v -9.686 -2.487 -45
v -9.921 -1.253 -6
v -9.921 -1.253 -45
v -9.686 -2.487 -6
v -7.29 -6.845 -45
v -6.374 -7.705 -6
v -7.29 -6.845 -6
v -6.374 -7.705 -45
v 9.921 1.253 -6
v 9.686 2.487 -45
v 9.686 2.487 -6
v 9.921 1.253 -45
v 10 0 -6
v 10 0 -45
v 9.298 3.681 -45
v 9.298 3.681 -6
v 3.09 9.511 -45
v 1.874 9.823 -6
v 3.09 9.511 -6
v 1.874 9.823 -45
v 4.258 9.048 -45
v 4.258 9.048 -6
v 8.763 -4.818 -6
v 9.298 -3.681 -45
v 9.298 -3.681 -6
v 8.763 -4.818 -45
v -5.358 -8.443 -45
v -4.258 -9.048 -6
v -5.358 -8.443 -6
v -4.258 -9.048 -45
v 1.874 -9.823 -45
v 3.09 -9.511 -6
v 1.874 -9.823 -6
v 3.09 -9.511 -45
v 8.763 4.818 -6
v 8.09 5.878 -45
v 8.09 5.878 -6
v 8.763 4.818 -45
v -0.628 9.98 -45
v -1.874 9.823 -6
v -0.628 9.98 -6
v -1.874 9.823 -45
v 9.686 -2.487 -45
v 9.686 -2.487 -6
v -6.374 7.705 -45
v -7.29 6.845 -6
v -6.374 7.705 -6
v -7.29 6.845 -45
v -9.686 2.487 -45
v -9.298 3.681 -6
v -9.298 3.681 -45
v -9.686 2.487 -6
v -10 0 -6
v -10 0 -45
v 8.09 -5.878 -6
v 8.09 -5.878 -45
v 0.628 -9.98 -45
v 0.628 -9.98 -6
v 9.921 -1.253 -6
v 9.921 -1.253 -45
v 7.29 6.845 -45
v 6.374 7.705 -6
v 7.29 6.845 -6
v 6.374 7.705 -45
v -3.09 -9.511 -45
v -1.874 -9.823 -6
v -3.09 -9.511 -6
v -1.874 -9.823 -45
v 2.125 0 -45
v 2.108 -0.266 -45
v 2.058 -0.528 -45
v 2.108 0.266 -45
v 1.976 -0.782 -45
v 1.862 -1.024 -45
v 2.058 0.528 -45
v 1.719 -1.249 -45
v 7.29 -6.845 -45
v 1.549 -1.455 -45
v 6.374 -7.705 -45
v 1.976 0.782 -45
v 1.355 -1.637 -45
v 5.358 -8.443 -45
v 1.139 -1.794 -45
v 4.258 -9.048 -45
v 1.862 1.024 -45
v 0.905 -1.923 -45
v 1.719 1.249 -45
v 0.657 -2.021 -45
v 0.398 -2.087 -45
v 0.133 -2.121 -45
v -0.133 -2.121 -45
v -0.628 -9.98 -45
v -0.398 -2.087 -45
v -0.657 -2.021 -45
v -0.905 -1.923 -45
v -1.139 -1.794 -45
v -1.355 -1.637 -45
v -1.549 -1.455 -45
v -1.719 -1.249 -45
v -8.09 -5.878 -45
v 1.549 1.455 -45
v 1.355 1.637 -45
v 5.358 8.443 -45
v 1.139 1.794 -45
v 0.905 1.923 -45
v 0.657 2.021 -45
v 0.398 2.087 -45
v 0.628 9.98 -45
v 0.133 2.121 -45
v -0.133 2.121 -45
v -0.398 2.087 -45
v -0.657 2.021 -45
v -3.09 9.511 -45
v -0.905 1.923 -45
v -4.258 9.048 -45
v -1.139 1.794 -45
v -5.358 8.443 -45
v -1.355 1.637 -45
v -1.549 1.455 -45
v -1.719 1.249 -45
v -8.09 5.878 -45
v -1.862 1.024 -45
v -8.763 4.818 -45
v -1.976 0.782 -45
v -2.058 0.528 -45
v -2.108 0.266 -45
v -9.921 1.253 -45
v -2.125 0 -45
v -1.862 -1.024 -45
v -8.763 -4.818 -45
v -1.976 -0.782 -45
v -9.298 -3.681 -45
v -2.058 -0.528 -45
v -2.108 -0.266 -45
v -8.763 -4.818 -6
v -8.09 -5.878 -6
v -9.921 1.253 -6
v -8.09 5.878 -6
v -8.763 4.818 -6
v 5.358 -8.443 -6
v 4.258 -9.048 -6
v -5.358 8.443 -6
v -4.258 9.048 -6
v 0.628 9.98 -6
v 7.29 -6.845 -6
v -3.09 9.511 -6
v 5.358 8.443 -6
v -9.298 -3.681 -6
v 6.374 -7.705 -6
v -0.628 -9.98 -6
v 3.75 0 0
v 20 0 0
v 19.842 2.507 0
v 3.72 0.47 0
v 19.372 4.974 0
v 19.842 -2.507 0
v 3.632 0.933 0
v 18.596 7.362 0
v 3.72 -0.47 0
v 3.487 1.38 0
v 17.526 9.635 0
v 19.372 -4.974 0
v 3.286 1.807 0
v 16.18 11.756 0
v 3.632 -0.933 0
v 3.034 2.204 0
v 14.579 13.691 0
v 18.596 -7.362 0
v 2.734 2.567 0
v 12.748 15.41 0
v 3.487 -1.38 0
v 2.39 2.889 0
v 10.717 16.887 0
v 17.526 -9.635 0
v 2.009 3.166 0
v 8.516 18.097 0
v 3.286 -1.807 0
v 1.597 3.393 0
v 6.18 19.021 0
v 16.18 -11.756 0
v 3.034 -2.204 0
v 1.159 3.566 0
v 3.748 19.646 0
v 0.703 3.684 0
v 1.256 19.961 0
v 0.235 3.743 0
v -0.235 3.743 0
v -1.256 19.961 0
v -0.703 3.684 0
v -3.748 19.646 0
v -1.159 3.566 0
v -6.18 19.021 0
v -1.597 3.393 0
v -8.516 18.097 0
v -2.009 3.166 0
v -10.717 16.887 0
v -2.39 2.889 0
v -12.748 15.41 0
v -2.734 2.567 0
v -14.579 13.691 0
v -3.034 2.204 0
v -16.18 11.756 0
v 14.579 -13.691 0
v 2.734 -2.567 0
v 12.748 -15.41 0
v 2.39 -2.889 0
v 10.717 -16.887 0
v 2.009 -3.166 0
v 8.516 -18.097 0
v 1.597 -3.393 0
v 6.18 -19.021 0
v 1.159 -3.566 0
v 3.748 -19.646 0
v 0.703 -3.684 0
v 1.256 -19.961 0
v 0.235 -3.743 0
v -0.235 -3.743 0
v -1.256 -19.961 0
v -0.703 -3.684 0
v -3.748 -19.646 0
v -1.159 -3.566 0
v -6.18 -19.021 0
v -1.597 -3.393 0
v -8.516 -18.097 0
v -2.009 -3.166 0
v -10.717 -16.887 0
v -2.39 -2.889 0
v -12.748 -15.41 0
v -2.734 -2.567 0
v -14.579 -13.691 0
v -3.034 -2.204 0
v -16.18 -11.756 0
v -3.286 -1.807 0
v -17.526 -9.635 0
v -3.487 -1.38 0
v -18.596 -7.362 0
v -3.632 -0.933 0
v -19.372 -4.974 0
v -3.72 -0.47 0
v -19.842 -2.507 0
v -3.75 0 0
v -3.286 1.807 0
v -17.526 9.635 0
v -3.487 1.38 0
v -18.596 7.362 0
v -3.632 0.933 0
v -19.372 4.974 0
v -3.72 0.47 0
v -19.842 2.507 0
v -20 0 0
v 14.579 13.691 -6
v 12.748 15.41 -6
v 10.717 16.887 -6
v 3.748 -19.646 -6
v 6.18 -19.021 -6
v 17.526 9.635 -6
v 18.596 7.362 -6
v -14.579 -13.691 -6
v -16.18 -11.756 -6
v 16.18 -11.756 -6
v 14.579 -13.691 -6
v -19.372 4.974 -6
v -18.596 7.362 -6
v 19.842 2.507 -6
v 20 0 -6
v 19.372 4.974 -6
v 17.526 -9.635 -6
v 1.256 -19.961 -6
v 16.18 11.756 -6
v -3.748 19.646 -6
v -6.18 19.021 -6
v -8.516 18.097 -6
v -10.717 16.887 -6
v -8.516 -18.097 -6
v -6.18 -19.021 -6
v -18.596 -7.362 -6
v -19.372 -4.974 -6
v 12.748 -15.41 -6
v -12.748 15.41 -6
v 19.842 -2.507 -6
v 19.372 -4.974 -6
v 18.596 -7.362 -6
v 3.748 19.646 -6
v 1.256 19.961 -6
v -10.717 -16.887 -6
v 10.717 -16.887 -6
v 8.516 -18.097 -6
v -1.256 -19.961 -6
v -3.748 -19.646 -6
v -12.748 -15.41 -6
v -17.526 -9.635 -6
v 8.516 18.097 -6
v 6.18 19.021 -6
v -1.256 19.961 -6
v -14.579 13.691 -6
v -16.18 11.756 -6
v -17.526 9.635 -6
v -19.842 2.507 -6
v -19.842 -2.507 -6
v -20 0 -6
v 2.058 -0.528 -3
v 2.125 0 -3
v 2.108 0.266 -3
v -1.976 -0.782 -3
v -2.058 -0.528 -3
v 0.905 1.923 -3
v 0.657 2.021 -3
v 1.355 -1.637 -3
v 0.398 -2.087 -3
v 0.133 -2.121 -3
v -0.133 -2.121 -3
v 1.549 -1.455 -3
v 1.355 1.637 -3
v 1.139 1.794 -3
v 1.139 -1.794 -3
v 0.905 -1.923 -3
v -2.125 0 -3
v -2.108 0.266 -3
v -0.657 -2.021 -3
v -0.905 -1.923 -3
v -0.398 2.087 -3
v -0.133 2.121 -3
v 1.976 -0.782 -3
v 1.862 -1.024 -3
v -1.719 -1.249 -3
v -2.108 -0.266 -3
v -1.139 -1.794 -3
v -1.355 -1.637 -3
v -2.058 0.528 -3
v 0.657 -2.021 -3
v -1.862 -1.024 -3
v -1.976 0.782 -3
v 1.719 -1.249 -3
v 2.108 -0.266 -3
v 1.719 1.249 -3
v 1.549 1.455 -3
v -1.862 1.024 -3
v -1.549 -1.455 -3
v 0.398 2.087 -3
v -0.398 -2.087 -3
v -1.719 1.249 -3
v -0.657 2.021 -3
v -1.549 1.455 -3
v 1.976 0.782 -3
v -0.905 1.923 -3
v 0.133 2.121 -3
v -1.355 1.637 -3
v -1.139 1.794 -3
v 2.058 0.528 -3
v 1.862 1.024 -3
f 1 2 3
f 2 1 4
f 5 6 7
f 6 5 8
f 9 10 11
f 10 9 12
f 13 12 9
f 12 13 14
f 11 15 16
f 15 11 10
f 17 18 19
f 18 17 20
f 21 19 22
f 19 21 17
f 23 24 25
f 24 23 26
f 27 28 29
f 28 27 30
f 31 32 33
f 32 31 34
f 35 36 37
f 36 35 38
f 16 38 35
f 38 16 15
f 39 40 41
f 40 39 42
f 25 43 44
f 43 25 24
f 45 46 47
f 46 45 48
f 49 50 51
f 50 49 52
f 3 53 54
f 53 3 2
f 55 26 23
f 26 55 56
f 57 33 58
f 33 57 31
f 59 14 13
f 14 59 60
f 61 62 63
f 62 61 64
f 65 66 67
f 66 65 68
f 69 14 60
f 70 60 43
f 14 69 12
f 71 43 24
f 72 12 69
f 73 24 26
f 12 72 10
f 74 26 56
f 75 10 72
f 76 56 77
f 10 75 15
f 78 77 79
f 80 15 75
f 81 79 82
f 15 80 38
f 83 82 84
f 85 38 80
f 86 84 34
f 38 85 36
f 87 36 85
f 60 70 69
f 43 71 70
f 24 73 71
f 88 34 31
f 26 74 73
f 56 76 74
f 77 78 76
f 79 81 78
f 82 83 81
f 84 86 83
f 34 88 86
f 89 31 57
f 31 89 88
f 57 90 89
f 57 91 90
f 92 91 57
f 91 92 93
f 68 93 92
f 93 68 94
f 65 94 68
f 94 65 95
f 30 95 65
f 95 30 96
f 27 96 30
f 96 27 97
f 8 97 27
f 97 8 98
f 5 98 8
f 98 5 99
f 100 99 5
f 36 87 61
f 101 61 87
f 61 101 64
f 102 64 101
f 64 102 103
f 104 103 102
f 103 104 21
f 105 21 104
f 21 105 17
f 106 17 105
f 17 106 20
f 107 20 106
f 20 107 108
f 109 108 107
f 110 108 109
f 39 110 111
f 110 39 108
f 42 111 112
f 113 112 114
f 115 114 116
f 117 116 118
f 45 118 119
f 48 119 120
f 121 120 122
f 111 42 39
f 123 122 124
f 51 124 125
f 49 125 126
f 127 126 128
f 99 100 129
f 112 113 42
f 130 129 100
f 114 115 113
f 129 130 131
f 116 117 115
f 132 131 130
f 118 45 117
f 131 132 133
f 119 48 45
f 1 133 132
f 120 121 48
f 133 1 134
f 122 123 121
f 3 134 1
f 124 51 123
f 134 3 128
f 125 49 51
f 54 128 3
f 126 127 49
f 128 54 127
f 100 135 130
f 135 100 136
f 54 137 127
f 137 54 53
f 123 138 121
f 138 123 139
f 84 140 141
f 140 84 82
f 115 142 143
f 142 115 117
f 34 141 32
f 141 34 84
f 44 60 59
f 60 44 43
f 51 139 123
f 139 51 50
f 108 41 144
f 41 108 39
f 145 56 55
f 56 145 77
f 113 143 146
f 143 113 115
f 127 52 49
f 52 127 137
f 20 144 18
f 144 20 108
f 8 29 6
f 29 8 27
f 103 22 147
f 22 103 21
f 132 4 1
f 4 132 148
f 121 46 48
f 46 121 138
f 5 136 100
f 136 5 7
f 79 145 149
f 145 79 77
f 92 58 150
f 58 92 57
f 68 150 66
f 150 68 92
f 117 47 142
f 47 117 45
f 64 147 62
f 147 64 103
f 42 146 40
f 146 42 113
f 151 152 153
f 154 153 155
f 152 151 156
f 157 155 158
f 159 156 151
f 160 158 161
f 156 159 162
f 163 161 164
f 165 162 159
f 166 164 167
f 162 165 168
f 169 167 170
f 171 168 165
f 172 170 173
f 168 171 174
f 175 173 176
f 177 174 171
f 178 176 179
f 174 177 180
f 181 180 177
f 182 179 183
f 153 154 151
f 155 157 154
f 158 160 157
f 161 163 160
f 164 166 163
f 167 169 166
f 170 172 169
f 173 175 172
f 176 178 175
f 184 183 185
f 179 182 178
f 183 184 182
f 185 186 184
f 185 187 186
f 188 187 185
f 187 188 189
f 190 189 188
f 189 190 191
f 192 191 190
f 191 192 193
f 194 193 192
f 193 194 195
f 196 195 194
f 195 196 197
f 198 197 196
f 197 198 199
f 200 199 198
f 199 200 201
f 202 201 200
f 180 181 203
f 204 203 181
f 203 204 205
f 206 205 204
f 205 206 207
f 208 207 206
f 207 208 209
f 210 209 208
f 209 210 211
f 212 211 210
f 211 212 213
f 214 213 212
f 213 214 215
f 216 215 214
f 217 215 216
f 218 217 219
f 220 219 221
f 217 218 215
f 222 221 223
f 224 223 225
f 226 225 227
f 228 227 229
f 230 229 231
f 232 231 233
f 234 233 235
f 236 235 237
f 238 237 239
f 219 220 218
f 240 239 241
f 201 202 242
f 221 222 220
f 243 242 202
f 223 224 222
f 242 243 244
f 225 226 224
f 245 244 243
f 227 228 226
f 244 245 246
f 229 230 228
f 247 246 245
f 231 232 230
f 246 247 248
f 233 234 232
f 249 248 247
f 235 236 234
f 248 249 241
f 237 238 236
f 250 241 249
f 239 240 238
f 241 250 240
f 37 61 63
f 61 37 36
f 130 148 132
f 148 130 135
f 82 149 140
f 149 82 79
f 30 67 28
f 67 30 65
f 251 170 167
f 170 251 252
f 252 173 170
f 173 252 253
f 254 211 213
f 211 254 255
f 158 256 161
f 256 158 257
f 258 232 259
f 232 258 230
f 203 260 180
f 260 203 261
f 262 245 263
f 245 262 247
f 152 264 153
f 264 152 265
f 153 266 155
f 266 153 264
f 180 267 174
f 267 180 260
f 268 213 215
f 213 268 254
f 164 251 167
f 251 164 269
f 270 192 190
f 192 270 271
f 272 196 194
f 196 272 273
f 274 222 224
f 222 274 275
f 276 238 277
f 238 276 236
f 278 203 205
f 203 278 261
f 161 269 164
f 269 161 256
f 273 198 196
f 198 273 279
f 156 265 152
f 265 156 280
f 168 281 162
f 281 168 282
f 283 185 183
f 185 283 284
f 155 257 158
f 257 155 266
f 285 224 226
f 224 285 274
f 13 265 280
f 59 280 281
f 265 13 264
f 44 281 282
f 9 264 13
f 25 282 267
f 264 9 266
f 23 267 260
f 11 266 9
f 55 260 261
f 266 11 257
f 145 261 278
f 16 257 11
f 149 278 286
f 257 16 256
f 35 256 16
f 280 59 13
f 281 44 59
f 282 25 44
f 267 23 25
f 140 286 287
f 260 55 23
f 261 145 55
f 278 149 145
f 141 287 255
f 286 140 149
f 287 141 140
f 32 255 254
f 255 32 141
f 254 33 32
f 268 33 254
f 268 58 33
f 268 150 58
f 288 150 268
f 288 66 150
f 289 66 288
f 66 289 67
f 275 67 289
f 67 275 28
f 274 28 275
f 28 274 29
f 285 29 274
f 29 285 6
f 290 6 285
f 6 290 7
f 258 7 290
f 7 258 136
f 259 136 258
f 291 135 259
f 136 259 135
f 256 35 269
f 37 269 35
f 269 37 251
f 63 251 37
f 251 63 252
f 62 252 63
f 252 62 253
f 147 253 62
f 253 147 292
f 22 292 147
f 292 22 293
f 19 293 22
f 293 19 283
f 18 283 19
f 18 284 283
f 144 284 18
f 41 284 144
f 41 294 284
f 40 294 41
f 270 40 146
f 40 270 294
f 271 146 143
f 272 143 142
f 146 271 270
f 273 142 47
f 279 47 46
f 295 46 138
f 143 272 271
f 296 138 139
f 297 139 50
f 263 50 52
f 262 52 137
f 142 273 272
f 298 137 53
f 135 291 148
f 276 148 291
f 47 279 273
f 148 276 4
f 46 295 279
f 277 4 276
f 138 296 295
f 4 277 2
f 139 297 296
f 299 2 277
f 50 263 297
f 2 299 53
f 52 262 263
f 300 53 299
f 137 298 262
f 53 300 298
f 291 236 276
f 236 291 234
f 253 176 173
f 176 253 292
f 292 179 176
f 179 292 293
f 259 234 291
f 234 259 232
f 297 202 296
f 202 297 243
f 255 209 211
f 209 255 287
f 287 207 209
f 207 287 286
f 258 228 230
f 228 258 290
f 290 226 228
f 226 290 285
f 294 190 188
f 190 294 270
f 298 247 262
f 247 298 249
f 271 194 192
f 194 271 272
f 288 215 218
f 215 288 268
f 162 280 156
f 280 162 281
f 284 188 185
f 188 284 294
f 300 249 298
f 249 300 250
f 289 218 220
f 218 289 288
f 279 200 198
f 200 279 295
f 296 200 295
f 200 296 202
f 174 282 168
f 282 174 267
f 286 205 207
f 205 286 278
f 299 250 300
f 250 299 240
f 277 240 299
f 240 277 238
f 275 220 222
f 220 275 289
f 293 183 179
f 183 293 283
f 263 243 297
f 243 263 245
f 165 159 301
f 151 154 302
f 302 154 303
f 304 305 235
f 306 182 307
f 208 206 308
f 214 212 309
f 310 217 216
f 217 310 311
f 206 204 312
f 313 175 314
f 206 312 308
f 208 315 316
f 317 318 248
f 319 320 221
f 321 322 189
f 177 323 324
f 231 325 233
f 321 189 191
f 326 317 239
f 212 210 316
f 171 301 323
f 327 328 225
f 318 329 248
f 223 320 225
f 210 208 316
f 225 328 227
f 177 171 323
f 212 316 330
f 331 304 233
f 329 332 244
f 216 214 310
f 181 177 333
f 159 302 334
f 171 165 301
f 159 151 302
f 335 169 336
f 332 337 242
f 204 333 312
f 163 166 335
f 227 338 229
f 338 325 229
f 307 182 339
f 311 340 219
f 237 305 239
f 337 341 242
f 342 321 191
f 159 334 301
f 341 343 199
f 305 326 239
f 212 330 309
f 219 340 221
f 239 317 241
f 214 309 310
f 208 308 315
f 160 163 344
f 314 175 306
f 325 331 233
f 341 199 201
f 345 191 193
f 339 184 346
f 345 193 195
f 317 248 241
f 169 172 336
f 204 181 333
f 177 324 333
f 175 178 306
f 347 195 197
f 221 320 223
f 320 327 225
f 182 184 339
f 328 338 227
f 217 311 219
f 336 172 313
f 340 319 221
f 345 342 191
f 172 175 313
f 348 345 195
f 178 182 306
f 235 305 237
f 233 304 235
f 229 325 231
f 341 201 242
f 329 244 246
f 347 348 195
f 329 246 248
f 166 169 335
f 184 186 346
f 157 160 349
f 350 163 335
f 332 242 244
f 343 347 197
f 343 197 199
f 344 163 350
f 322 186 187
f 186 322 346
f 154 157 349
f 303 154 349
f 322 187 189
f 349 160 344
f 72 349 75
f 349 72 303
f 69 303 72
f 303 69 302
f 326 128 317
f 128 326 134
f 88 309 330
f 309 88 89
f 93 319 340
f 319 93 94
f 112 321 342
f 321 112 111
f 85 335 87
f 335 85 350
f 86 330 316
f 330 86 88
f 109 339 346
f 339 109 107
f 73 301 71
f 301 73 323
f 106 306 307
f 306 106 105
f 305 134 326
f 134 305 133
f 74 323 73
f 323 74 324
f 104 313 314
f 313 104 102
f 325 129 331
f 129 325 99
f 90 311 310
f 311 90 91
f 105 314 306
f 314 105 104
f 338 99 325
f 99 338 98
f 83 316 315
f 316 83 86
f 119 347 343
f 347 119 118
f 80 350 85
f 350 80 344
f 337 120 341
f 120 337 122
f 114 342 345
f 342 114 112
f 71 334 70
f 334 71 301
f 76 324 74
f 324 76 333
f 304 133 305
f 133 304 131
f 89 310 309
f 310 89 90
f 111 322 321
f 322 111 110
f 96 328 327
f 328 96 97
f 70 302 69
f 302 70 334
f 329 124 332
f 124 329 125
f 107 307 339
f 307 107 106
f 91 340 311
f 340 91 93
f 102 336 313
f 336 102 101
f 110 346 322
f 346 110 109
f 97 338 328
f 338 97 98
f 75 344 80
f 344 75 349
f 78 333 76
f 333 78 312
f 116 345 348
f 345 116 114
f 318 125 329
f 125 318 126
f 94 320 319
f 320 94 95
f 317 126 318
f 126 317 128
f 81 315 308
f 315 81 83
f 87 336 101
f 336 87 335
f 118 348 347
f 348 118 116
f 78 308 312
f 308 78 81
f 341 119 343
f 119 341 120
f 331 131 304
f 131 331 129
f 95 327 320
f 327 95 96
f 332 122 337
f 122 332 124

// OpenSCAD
$fn = 50;


difference() {
	union() {
		translate(v = [0, 0, -45.0000000000]) {
			cylinder(h = 45, r = 10.0000000000);
		}
		translate(v = [0, 0, -6.0000000000]) {
			cylinder(h = 6, r = 20.0000000000);
		}
	}
	union() {
		translate(v = [0, 0, 0]) {
			rotate(a = [0, 0, 0]) {
				difference() {
					union() {
						#translate(v = [0, 0, -45.0000000000]) {
							cylinder(h = 45, r = 2.0000000000);
						}
						#translate(v = [0, 0, -3]) {
							cylinder(h = 3, r1 = 2.1250000000, r2 = 3.7500000000);
						}
						#translate(v = [0, 0, -45.0000000000]) {
							cylinder(h = 45, r = 2.1250000000);
						}
						#translate(v = [0, 0, -45.0000000000]) {
							cylinder(h = 45, r = 2.0000000000);
						}
					}
					union();
				}
			}
		}
	}
}
